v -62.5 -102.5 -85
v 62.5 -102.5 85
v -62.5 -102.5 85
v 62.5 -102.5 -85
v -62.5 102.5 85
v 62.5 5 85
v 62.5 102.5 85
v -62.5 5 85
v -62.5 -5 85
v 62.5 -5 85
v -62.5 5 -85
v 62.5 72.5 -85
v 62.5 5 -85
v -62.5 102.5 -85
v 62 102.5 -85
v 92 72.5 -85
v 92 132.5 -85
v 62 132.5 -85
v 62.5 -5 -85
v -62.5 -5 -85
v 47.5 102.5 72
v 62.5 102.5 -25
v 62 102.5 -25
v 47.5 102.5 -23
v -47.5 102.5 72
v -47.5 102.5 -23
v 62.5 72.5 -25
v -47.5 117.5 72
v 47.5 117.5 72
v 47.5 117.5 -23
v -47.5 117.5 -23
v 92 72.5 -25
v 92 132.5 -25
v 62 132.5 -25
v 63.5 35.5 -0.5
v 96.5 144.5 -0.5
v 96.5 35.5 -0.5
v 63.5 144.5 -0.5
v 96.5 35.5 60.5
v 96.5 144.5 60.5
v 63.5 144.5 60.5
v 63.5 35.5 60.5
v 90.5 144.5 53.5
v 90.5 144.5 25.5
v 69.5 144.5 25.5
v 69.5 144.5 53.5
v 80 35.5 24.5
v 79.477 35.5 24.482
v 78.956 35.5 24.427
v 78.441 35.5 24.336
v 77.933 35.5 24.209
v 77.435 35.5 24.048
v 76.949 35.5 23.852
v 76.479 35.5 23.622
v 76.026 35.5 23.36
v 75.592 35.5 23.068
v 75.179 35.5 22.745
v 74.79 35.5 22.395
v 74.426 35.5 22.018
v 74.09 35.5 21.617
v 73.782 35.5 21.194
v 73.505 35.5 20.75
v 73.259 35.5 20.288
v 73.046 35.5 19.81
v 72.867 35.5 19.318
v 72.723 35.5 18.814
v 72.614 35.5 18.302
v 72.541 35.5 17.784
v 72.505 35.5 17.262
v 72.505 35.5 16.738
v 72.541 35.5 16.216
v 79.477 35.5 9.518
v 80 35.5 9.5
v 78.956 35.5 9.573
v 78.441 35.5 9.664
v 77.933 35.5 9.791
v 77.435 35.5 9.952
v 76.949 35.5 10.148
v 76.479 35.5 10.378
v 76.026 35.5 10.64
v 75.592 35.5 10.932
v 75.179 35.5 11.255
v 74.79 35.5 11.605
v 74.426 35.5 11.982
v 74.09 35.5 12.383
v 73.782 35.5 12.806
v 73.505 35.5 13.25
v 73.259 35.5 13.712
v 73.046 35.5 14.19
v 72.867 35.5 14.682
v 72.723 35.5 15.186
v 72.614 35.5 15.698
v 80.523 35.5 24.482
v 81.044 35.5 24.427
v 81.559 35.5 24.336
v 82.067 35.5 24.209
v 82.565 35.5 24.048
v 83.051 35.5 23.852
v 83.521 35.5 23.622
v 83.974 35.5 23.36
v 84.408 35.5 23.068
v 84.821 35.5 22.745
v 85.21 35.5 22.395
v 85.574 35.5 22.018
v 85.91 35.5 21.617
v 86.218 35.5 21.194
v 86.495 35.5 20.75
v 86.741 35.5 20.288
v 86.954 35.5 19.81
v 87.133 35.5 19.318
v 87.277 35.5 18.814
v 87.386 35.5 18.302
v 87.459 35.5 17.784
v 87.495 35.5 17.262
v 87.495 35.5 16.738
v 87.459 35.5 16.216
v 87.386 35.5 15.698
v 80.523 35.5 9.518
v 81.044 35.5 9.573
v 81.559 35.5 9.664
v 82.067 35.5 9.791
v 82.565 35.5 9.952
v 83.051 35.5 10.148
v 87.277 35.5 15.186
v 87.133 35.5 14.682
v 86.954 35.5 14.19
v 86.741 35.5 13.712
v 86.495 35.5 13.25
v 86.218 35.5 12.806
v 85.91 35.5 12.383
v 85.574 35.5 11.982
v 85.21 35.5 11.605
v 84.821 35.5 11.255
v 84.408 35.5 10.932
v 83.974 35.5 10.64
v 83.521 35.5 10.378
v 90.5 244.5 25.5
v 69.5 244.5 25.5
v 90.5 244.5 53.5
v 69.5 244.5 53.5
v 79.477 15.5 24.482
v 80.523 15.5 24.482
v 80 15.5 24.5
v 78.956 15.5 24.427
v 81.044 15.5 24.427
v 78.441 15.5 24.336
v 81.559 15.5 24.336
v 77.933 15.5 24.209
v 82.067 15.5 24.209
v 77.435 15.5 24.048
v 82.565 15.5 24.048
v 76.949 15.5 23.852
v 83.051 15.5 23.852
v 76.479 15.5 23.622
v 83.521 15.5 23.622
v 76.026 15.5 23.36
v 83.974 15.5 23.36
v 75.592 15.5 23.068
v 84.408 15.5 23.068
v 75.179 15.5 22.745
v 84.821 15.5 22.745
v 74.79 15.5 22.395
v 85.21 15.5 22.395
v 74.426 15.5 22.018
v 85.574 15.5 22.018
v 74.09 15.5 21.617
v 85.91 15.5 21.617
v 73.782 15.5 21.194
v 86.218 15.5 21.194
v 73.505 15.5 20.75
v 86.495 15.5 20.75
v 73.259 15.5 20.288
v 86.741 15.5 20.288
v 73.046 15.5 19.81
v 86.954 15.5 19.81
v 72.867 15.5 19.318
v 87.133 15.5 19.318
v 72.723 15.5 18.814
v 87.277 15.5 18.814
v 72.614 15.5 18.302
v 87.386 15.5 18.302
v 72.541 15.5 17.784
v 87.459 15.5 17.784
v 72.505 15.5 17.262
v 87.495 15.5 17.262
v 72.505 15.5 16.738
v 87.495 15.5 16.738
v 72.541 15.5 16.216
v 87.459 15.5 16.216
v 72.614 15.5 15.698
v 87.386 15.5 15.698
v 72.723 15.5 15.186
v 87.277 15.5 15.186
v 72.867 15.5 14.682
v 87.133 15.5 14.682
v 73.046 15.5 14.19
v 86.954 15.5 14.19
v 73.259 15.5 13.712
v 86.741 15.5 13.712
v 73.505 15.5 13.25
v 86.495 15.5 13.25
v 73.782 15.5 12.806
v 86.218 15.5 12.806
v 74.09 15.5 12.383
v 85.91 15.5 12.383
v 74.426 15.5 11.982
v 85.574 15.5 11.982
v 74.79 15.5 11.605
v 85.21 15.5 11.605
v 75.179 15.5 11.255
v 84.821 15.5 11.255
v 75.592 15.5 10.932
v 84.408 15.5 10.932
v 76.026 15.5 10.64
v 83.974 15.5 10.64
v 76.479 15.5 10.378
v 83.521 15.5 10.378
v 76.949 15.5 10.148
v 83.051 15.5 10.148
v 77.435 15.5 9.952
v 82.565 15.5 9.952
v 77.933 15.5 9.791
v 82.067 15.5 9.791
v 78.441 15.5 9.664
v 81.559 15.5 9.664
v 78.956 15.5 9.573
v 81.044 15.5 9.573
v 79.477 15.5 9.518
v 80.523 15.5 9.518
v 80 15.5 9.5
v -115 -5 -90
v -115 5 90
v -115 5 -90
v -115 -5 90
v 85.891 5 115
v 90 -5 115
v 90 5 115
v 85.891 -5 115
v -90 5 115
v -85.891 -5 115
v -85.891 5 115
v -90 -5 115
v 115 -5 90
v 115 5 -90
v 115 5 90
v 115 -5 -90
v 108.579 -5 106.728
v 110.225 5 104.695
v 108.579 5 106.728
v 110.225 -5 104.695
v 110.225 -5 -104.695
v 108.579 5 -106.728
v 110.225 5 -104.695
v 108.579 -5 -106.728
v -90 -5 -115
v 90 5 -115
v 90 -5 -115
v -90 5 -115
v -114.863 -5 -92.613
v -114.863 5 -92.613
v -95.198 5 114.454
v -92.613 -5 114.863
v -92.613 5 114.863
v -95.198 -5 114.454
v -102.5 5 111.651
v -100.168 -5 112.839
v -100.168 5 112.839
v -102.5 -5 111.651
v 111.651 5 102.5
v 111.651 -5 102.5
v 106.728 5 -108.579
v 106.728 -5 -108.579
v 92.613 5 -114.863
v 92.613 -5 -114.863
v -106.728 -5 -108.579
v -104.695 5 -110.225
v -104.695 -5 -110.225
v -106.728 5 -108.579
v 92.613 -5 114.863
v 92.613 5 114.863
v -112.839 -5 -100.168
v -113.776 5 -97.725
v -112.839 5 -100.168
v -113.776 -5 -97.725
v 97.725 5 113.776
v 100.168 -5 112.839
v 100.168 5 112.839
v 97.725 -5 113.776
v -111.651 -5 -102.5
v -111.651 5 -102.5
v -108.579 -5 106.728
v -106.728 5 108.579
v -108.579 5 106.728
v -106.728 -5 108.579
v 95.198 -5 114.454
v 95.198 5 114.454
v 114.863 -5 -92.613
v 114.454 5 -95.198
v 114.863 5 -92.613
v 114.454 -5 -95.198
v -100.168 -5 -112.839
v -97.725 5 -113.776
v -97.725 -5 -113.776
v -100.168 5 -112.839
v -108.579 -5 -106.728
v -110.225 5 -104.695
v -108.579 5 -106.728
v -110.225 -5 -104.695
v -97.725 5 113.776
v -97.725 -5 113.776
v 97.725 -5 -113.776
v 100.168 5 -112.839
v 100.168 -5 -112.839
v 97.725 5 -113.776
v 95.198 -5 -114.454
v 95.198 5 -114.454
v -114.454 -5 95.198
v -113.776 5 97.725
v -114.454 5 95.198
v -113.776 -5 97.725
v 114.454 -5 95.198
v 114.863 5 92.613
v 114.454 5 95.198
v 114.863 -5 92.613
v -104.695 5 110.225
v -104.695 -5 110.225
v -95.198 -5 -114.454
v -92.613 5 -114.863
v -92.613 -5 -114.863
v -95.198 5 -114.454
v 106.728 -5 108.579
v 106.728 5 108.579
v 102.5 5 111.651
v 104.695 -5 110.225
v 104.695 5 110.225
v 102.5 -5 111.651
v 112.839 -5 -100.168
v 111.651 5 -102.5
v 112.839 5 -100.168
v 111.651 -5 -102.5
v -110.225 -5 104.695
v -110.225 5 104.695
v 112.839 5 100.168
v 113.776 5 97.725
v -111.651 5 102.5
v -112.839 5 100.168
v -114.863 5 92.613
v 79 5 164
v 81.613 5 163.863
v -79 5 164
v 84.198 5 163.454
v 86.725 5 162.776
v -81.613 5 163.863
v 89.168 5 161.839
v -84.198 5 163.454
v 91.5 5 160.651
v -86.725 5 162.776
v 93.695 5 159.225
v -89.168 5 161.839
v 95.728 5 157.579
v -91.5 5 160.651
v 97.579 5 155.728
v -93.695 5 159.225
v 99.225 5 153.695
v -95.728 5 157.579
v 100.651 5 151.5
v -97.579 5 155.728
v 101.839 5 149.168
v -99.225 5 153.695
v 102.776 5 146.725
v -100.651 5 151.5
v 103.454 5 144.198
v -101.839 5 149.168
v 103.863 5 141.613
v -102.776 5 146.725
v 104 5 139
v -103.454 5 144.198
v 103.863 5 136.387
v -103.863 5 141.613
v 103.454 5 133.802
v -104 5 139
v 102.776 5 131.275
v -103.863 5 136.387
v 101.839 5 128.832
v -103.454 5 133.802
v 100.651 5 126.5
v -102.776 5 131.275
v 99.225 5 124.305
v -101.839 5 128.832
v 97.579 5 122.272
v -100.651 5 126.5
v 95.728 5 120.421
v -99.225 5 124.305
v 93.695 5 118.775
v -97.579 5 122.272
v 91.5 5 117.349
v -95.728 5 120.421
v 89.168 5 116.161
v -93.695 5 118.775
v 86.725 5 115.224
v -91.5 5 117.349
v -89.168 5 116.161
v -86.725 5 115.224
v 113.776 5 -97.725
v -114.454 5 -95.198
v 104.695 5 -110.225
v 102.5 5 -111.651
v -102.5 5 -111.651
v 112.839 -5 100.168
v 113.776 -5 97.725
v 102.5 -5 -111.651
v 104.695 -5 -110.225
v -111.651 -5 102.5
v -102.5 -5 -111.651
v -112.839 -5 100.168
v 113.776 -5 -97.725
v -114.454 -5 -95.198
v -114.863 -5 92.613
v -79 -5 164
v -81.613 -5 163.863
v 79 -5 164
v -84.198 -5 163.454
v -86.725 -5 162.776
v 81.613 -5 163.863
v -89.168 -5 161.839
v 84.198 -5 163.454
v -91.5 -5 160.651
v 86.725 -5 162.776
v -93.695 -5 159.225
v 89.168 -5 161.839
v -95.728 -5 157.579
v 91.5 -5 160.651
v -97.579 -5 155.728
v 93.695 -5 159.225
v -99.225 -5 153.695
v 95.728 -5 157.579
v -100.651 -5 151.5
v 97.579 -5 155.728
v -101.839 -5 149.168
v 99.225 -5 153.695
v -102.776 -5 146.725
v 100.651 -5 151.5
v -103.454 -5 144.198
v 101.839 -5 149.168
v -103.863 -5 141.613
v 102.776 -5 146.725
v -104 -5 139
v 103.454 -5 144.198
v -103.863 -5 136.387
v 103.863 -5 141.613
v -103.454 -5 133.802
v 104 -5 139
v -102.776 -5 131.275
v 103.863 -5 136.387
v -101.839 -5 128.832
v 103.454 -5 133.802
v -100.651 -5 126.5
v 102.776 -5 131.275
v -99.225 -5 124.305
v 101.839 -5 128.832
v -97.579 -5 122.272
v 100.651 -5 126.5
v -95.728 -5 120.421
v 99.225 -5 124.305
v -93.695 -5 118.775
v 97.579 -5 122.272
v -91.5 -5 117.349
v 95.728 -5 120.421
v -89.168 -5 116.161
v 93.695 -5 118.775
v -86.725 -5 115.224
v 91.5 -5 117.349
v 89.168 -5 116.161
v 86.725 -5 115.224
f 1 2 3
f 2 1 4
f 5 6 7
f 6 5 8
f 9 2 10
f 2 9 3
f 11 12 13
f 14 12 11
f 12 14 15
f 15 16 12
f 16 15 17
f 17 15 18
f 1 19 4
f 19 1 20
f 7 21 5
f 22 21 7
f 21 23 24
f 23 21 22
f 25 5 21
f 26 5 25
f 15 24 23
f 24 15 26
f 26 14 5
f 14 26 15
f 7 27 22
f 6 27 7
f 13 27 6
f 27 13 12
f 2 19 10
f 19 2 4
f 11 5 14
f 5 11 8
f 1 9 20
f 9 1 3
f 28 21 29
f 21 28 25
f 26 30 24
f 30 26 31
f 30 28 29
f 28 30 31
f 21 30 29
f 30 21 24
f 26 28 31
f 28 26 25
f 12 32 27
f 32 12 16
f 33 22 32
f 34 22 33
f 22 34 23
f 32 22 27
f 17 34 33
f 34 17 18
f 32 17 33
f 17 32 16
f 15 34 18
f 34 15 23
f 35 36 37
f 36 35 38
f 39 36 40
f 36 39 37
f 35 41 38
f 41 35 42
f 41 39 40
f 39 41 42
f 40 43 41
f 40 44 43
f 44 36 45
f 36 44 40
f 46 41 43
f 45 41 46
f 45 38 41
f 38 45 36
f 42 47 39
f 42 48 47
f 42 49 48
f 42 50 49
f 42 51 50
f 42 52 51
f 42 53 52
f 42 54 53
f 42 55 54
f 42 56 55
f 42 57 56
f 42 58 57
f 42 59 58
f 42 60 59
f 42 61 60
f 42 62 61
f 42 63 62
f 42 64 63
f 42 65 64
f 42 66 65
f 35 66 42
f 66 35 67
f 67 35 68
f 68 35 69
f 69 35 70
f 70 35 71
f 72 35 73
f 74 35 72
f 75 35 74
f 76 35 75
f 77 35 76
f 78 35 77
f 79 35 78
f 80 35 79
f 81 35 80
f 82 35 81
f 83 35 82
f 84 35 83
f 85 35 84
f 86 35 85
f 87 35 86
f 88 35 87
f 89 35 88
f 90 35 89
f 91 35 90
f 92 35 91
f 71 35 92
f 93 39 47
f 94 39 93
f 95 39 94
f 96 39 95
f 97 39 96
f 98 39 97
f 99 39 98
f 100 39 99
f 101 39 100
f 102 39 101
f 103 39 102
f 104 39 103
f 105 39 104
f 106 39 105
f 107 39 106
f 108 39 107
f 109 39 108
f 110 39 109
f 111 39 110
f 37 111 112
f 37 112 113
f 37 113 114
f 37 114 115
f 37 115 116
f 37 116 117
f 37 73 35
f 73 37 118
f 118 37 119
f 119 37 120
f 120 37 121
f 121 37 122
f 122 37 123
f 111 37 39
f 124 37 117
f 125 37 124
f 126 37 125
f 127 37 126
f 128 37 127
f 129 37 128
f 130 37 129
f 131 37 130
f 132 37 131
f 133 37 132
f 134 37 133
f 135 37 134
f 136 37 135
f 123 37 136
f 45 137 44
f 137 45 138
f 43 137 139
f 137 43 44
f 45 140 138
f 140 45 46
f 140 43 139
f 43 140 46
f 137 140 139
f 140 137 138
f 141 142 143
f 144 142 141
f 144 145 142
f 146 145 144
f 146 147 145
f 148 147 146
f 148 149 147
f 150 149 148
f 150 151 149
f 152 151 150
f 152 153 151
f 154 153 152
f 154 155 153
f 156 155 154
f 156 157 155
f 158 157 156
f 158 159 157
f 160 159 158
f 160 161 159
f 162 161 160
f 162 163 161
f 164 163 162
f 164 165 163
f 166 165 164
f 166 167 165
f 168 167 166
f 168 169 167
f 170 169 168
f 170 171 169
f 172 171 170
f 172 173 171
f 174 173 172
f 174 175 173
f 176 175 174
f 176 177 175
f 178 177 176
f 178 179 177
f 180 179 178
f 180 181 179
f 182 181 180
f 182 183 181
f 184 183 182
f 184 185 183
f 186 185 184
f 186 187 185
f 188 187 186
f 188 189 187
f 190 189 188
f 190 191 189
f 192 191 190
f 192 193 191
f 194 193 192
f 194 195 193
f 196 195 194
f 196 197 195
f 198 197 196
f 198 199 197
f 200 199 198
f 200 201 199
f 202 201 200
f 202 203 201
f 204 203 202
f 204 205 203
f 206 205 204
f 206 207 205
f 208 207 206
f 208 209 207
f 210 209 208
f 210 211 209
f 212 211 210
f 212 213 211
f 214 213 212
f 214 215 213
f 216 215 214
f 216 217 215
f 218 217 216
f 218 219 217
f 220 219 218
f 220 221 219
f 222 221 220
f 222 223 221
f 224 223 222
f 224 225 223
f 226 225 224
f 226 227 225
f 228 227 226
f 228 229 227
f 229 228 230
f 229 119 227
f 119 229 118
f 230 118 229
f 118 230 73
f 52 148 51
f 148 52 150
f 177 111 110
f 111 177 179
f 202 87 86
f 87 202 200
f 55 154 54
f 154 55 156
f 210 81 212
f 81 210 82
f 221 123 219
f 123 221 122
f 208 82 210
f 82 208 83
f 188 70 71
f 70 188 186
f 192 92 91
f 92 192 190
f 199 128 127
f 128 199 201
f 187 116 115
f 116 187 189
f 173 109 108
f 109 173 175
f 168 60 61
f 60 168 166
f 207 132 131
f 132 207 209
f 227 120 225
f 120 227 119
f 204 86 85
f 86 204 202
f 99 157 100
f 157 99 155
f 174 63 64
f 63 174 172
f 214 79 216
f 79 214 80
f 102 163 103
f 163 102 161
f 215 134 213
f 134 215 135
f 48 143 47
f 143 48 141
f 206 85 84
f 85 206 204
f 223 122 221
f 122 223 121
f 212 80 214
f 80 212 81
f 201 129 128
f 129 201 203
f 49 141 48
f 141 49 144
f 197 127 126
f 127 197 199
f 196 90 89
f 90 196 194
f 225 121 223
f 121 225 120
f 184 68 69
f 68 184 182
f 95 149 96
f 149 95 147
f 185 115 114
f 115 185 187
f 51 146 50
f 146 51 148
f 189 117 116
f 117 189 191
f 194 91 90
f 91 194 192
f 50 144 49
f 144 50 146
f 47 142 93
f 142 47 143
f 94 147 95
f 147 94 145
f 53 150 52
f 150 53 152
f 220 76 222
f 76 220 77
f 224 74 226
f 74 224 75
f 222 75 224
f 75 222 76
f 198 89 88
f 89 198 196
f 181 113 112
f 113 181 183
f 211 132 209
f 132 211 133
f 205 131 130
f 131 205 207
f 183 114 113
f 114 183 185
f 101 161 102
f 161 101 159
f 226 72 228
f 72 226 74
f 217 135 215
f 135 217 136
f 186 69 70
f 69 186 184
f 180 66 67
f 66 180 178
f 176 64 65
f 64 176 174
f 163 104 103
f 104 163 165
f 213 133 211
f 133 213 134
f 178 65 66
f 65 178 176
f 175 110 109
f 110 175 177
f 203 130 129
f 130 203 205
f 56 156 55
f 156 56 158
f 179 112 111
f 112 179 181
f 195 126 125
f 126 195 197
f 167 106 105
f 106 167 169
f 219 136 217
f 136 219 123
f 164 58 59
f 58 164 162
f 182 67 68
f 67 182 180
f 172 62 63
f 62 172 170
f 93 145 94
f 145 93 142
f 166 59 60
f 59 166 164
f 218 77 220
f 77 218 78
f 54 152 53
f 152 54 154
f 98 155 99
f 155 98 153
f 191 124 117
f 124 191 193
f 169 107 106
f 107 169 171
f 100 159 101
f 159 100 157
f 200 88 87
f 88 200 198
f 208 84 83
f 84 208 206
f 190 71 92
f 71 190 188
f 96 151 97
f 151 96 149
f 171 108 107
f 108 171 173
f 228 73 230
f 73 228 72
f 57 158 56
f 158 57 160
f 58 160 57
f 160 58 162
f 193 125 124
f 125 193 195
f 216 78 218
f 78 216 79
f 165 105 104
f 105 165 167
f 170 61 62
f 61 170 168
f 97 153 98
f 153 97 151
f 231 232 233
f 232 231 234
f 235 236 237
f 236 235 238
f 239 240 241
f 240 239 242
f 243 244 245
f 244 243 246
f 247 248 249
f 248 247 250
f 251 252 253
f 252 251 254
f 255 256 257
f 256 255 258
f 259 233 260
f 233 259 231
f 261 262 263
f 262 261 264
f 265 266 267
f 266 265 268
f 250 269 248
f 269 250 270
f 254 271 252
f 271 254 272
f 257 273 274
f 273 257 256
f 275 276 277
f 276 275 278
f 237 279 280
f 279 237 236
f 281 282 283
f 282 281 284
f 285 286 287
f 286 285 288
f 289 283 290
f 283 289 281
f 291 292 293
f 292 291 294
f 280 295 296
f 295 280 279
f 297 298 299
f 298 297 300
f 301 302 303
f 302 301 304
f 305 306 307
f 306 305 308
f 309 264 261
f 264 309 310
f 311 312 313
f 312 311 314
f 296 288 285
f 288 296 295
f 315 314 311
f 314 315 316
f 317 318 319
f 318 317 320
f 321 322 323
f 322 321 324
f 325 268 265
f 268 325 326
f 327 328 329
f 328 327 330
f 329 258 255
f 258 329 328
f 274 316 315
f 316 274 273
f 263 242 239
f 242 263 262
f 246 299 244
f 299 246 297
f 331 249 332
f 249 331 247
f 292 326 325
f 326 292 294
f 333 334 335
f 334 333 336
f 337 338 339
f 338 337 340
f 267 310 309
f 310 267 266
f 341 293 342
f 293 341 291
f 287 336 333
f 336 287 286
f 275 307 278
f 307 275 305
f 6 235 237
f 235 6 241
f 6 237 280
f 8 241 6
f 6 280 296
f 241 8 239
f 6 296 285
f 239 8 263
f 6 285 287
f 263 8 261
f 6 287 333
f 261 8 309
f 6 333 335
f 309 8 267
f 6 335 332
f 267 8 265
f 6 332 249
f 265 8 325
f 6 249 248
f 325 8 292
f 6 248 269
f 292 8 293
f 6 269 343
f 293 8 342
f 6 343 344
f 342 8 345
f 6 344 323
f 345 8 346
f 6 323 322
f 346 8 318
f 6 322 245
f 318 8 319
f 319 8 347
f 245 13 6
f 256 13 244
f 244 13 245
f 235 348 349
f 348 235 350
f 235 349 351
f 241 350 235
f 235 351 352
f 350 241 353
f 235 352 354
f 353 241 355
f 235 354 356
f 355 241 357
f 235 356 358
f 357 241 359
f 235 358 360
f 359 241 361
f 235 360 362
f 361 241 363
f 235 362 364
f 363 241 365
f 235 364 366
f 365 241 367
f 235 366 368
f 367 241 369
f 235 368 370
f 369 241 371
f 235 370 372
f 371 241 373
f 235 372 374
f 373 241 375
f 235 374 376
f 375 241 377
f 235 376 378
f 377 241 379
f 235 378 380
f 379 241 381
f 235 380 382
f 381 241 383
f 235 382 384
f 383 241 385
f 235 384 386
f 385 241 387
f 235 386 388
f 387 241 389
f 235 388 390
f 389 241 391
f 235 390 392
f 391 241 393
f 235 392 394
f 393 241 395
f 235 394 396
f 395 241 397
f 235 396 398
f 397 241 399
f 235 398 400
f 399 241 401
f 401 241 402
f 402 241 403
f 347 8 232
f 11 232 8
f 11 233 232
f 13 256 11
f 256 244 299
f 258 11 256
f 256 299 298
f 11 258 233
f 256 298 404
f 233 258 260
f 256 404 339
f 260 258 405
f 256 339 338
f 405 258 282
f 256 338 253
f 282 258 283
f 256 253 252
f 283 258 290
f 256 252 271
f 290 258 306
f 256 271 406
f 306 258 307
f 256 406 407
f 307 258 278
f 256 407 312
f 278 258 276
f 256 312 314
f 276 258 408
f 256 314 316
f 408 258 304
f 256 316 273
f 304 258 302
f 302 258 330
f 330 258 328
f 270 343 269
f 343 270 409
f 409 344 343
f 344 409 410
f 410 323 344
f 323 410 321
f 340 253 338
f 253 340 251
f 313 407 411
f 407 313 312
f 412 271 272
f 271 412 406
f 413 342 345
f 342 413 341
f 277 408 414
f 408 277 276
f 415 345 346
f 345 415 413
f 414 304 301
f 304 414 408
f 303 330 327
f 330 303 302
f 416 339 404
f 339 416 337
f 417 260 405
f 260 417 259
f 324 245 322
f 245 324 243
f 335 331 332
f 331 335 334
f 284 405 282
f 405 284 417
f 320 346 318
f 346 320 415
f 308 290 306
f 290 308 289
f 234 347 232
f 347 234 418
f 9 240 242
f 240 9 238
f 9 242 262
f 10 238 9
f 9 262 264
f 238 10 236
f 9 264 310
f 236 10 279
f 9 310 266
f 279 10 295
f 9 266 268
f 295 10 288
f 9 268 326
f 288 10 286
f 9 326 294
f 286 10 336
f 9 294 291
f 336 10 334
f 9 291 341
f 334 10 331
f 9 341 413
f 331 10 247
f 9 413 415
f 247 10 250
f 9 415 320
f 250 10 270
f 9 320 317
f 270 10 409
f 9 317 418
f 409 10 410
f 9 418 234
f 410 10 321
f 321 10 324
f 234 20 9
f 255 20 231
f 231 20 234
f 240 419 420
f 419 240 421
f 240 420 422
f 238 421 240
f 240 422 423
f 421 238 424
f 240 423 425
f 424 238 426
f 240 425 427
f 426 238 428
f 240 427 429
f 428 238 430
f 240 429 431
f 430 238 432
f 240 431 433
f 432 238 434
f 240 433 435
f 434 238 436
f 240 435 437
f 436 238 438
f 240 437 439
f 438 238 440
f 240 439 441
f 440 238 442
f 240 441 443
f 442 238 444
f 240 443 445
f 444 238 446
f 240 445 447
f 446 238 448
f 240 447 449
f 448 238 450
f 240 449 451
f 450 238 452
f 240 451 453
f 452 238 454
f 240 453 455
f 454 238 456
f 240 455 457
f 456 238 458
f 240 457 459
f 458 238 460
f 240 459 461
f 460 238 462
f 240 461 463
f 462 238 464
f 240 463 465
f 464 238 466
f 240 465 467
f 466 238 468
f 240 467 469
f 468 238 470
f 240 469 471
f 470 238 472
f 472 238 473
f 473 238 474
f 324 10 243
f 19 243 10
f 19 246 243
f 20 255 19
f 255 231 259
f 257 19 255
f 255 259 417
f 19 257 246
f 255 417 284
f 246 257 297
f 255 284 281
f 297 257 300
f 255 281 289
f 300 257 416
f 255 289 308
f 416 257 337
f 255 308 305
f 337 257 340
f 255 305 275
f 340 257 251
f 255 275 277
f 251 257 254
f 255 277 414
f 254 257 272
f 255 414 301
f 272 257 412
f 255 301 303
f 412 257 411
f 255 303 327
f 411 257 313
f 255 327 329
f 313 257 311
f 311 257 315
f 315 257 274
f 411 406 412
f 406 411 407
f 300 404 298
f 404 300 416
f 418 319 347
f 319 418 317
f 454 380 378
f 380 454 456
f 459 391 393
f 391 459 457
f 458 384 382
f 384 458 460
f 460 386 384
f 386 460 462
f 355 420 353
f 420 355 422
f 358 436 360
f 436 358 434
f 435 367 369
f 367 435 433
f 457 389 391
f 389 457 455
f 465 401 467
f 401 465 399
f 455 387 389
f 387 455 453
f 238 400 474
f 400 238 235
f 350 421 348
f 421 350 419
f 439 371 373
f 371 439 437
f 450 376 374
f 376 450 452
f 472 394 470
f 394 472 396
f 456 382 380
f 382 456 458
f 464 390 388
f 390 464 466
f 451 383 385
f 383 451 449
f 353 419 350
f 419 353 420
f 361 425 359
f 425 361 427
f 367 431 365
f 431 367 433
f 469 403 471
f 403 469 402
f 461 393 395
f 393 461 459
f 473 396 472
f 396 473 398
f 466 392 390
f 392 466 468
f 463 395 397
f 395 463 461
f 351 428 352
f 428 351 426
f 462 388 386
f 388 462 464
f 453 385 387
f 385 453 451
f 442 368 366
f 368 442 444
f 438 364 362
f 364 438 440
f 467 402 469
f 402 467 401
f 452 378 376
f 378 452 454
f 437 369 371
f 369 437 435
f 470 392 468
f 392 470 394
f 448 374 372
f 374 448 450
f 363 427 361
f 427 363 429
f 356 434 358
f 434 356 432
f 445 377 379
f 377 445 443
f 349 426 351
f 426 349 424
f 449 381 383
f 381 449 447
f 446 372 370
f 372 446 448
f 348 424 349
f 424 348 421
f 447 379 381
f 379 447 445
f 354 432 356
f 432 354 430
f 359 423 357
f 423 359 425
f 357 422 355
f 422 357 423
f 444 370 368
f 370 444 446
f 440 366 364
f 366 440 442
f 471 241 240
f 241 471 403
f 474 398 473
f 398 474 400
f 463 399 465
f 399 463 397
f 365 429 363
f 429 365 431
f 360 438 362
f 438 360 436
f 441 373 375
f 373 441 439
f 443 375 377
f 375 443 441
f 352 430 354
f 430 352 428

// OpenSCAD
// file: Lib/o-ring.scad
module o_ring(id=20,girth=2.5,$fn=180){
    rotate_extrude(angle=360,$fn=$fn)translate([(id+girth)/2,0])circle(d=girth);
    //cylinder(d=id,h=0.1, center=true);    
}

//o_ring(id=40, girth=5);


module o_ring_groove(girth=3,length = 50, height = 100, radius = 15){
    translate([radius+(girth/2),radius+(girth/2),0]){
        difference(){
            o_ring(id=radius*2,girth=girth, $fn=$fn);
            translate([15,0,0])cube([30,40,6], center=true);
            translate([0,15,0])cube([40,30,6], center=true);
        }

        translate([-radius-(girth/2),length/2,0])
            rotate([90,0,0])
                cylinder(h=length+0.01,d=girth, center=true);

        translate([height/2,-radius-(girth/2),0])
            rotate([0,90,0])
                cylinder(h=height+0.01,d=girth, center=true);
    }
}

o_ring_groove();
// file: Lib/fillet_cylinder.scad
module filleted_cylinder(
    cylinder_height=2,
    cylinder_radius=1,
    fillet_radius_bottom=1,
    fillet_radius_top=0,
    nfaces=50
) {
    /* created by Kevin Lam on Dec 3, 2016 */
    union() {      
        cylinder(cylinder_height, r=cylinder_radius, $fn=nfaces, false);
        
        if (fillet_radius_bottom > 0) {
            difference() {
                cylinder(fillet_radius_bottom, r=cylinder_radius+fillet_radius_bottom, $fn=nfaces, false);
                translate([0, 0, fillet_radius_bottom])
                rotate_extrude($fn=nfaces)
                translate([cylinder_radius+fillet_radius_bottom, 0, 0])
                circle(fillet_radius_bottom, $fn=nfaces);
            }
        }
        
        if (fillet_radius_top>0) {
            difference() {
                translate([0,0,cylinder_height-fillet_radius_top])
                cylinder(fillet_radius_top, r=cylinder_radius+fillet_radius_top, $fn=nfaces, false);
                
                translate([0, 0, cylinder_height-fillet_radius_top])
                rotate_extrude($fn=nfaces)
                translate([cylinder_radius+fillet_radius_top, 0, 0])
                circle(fillet_radius_top, $fn=nfaces);
            }
        }
    }
}
// file: Lib/prism.scad
   module prism(l, w, h){
   polyhedron(
           points=[[0,0,0], [l,0,0], [l,w,0], [0,w,0], [0,w,h], [l,w,h]],
           faces=[[0,1,2,3],[5,4,3,2],[0,4,5,1],[0,3,4],[5,2,1]]
           );

   }
   
// file: Lib/corner_radiuser.scad
module cornerRadiuser(radius=6){
    difference(){
        translate([radius/2,radius/2,0])
        cube([radius,radius,radius*2], center=true);
        cylinder(h=(radius*2)+2,r=radius, center=true);
    }
}
// file: Lib/steppers.scad
/**
 * Implementation of a model of a 28BYJ-48 type cheapo stepper motor
 */
use <mirrorcopy.scad>;
module stepper28BYJ48(){
    color("lightgrey"){
        translate([0,-8,0]){
            // Motor body
            translate([0,0,(19/2)*-1]){
                cylinder(d=28,h=19, center=true);
            }

            // Motor snooter
            translate([0,8,0]){
                translate([0,0,(1.5/2)])cylinder(d=9,h=1.5, center=true);
                difference(){
                    translate([0,0,(5/2)+2])cylinder(d=5,h=6, center=true);
                    mirrorCopy([0,1,0]){
                        translate([0,4,(5/2)+2.1])cube([5,5,6.2], center=true);
                    }
                }
            }
            
            // cable gland
            translate([0,(17/2)*-1,(19/2)*-1]){
                cube([14.8,17,19], center=true);
            }
            
            // Attachment crossbar
            difference(){
                hull(){
                    mirrorCopy([1,-0,0]){
                        translate([(35/2),0,(1/2)*-1]){
                            cylinder(h=1,d=7, center=true);
                        }
                    }
                }
                mirrorCopy([1,-0,0]){
                    translate([(35/2),0,(1/2)*-1]){
                        cylinder(h=1+0.01,d=4.2, center=true);
                    }
                }
            }
        }
    }
}


module stepper28BYJ48_cutouts(){
    color("orange"){
        translate([0,-8,0]){
            mirrorCopy([1,-0,0]){
                translate([(35/2),0,(1/2)*-1]){
                    cylinder(h=1+0.01,d=4.2, center=true);
                }
            }
        }
    }
}

module nemaCutout(shaftClearance, shaftGirth, shaftLength, frameSize, holeSpacing,holeDiameter=3,       nemaSlotSlackMM=0, shaft=false){
    translate([0,0,frameSize/-2]){
        hull(){
            mirrorCopy([0,1,0]){
                translate([0,nemaSlotSlackMM/2]){
                    cube([frameSize*1.01,frameSize*1.01,frameSize], center=true);
                }
            }
        }
    }
    if(!shaft){
        translate([0,0,10/2]){
            mirrorCopy([1,0,0]){
                mirrorCopy([0,1,0]){
                    translate([holeSpacing/2,holeSpacing/2,0]){
                        hull(){
                            mirrorCopy([0,1,0]){
                                translate([0,nemaSlotSlackMM/2,0]){
                                    cylinder(d=holeDiameter*1.1,h=30,center=true);
                                }
                            }
                        }
                    }
                }
            }
        }
    }
    
    if(!shaft){
        translate([0,0,-0.5]){
            cylinder(d=shaftClearance*1.03,h=shaftLength+1);
        }
    }else{
        difference(){
            cylinder(d=shaftGirth*1.03,h=shaftLength*2, $fn=360);
            translate([frameSize/-2,(shaftGirth/2)-(shaftGirth)*0.15,shaftLength*0.3+0.01]){
                cube([frameSize,frameSize/2,shaftLength*0.70]);
                translate([0,0,shaftLength*0.70-1])cube([frameSize,frameSize/2,shaftLength+1]);
            }
        }
    }
}

module nema14_cutout(){
    nemaCutout(22,5,24,35,26,3,2, shaft);
}

module nema17_cutout(shaft=false){
    
    nemaCutout(22,5,24,42.3,31,3,2, shaft);
}

module nema23_cutout(shaft=false){
    //nemaCutout(, shaft);
}
nema17_cutout(true);
//nema23_cutout(true);
// file: Lib/metric_bolts.scad
use <mirrorcopy.scad>
capSizeMSizeMultiplier = 1.66*1.01;
printingKerfMM = 0.6;
circleFacets = 60;
boltColour = "LightSkyBlue";
boltClearanceColour = "LightSteelBlue";
boltClearanceTransparency = 0.3;

module metricBoltHex(mSize, structural=false, recessNut=0, recessNutIsCircleMM=false, chamfer=false){
    // Hex diameter = mSize * 1.8, (or 2.0 if structural
    // We add 1% to make the hex slip in better
    hexDiameter = (mSize * (structural?2.0:1.8) * 1.01) + printingKerfMM;

    color(boltColour)
    translate([0,0,(mSize*0.7)/2])
    cylinder(d=hexDiameter,h=mSize * 0.7, $fn=6, center=true);
    
    if(recessNut > 0){
        if(recessNutIsCircleMM==false){
            color(boltClearanceColour, boltClearanceTransparency)
                translate([0,0,(recessNut/2)*-1+0.1])
                    cylinder(d=hexDiameter,h=recessNut+0.1, $fn=6, center=true);
        }else{
            color(boltClearanceColour, boltClearanceTransparency)
                translate([0,0,(recessNut/2)*-1+0.1])
                    cylinder(d=recessNutIsCircleMM>hexDiameter?recessNutIsCircleMM:hexDiameter,h=recessNut+0.1, $fn=circleFacets, center=true);
        }
    }
    if(chamfer){
        chamferHeight = mSize*1.5*0.595;
        color(boltClearanceColour, boltClearanceTransparency)
            translate([0,0,(mSize * 0.7)+(chamferHeight/2)])
                cylinder(d1=hexDiameter,d2=0,h=chamferHeight, center=true, $fn=6);
    }
}

module metricSocketCap(mSize, length, structural=false,recessCap=0, chamfer=false, overrideCapSize=0){
    //cap size = M number * 1.5.
    // We add 1% to make the cap head spin nicely in the hole.
    capSize = overrideCapSize > 0 ? overrideCapSize : (mSize * capSizeMSizeMultiplier) + printingKerfMM;
    
    color(boltColour)
        translate([0,0,(length + ((mSize*1.25)/2))])
            cylinder(d=capSize,h=mSize*1.25, center=true, $fn=circleFacets);
    //echo (str("cap size is ", capSize));
    if(recessCap > 0){
        color(boltClearanceColour, boltClearanceTransparency)
        translate([0,0,(length + ((recessCap/2)+(mSize*1.25)))])
        cylinder(d=capSize,h=recessCap+0.01, center=true, $fn=circleFacets);
    }
    if(chamfer){
        color(boltClearanceColour, boltClearanceTransparency)
        translate([0,0,(length-((mSize*1.5*0.595)/2))])
        cylinder(d2=capSize,d1=0,h=mSize*1.5*0.595, center=true, $fn=circleFacets);
    }
}

module metricShaft(mSize, length, structural=false){
    color(boltColour)
        translate([0,0,(length/2)])
            cylinder(d=mSize+printingKerfMM, h=length+0.01, center=true, $fn=circleFacets);
}

module metricSocketScrew(mSize, length, structural=false, recessCap=0, chamfer=false, overrideCapSize=0){
    metricSocketCap(mSize, length, structural=structural, recessCap=recessCap, chamfer=chamfer, overrideCapSize=overrideCapSize);
    metricShaft(mSize, length, structural=structural);
}
module metricSocketScrewSlot(mSize, length, width, structural=false, recessCap=0, chamfer=false, overrideCapSize=0){
    
    hull()mirrorCopy()
        translate([width/2,0,0])
            metricSocketCap(mSize, length, structural=structural, recessCap=recessCap, chamfer=chamfer, overrideCapSize=overrideCapSize);
    hull()mirrorCopy()
        translate([width/2,0,0])
            metricShaft(mSize, length, structural=structural);
}

module metricCapheadAndBolt(mSize, length=40, structural=false, recessCap=0, recessNut=0, recessNutIsCircleMM=false, chamfer=false, overrideCapSize=0){
    capSize = overrideCapSize > 0 ? overrideCapSize : (mSize * capSizeMSizeMultiplier) + printingKerfMM;

    /*echo (str("Creating a M",mSize, " size, ", length, "mm long bolt with a ", capSize, "mm wide caphead and bolt ", chamfer?"with":"without", " chamfering."));
    if(recessCap){
        echo (str("It has a ", recessCap, "mm recessed cap"));
    }
    if(recessNut){
        echo (str("It has a ", recessCap, "mm recessed nut"));
    }/**/
    translate([0,0,((length/2)+((mSize*1.25)/2))*-1])
    union(){
        translate([0, 0, 0])
        metricSocketScrew(mSize, length, structural=structural, recessCap=recessCap, chamfer=chamfer, overrideCapSize=overrideCapSize);
        metricBoltHex(mSize,structural, recessNut=recessNut, recessNutIsCircleMM=recessNutIsCircleMM, chamfer=chamfer);
    }
}
module metricCapheadAndNutsert(mSize, length=40, nutsertLength=13, mSizeRatio=1.35 ,structural=false, recessCap=0, chamfer=false,overrideCapSize=0){
        capSize = overrideCapSize > 0 ? overrideCapSize : (mSize * capSizeMSizeMultiplier) + printingKerfMM;
    
    translate([0,0,((length/2)+((mSize*1.25)/2))*-1])
    union(){
        translate([0, 0, 0])
        metricSocketScrew(mSize, length, structural=structural, recessCap=recessCap, chamfer=chamfer, overrideCapSize=overrideCapSize);
        metricThreadedNutsert(mSize, length=nutsertLength,mSizeRatio=mSizeRatio);
    }
}

module metricThreadedNutsert(mSize, length=13, mSizeRatio=1.35){
    width = mSize * mSizeRatio;
    translate([0,0,-1]){
        translate([0,0,length/2])
            cylinder(h=length, d=width, center=true);
        translate([0,0,length/8/2])
            cylinder(h=length/8, d2=width, d1=width*1.1, center=true);
    }
}
/**/
translate([0,10,0])
metricCapheadAndBolt(6, 40);

translate([0,10,0])
metricCapheadAndBolt(6, 40, recessNut=20, recessNutIsCircleMM=20);

translate([20,10,0])
metricCapheadAndBolt(6, 40, recessNut=1, recessCap=1, chamfer=true);

translate([40,10,0]){
    metricCapheadAndNutsert(6, 40, 13, recessCap=1, chamfer=true);
}
translate([60,10,0]){
    metricSocketScrewSlot(6,40,10);
}
/**/
/*
translate([0,10,0])
metricCapheadAndBolt(6, 20, recessNut=10, recessCap=10);
/*
translate([0,20,0])
metricCapheadAndBolt(6, 20, chamfer=true);

translate([20,0,0])
metricCapheadAndBolt(10, 40);

translate([20,20,0])
metricCapheadAndBolt(10, 40, recessNut=10, recessCap=10);

translate([20,40,0])
metricCapheadAndBolt(10, 40, chamfer=true);
*/
// file: Lib/pcd.scad
module pcd(degrees, totalDegrees=360){
    count=totalDegrees/degrees;
    for(i=[1 : count]){
        rotate(degrees*i)
        children();
    }
}

module pcdAtFixedDegrees(degrees){
    for(degree=degrees){
        rotate(degree)
        children();
    }
}

pcd(30)
    translate([30,0,0])
        cylinder(h=10,d=5, center=true, $fn=30);
// file: Lib/hollower.scad
module hollower(wallThickness=1, box=300, bottomLift=0){
    difference() {
        children();
        translate([0,0,-box/2]) cube(box,center=true);
        difference() {
            translate([0,0,(box/2)-0.001+bottomLift]) cube(box,center=true);
            minkowski() {
                translate([0,0,0])cube(2*wallThickness,center=true);  
                difference() {
                    translate([0,0,(box/2)+bottomLift]) cube(box,center=true);
                    children();
                }
            }
        }
    }
}
// file: Lib/extrusion.scad
use <mirrorcopy.scad>
module doubleExtrusion(width,length, center=false){
    extraWallWidth = width*0.09;
    mirrorCopy([0,1,0]){
        color("orange")
        translate([0,(width - extraWallWidth)/2,length/2])
        cube([center?0:width/2,extraWallWidth,length], center=true);
    }
    
    translate([(width/2),0,0])
    children();
    translate([(width/2)*-1,0,0])
    children();
    color("grey",0.1)hull(){
        translate([(width/2),0,0])
        children();
        translate([(width/2)*-1,0,0])
        children();
    }
}

module extrusion_sub(length=10, outer=40, tSlot=8, gusset=4.5, bore=7, center=false){
    translate([0,0,center?0:length/2]){
        difference(){
            color("orange")
            union(){
                // Corners
                mirrorCopy([1,0,0]){
                    mirrorCopy([0,1,0]){
                        difference(){
                            union(){
                                translate([((outer-(outer-tSlot)/2)/2),(outer-(gusset))/2,0])
                                cube([(outer-tSlot)/2, (gusset),length], center=true);
                                mirror([-1,1,0])
                                translate([((outer-(outer-tSlot)/2)/2),(outer-(gusset))/2,0])
                                cube([(outer-tSlot)/2, (gusset),length], center=true);
                            }
                            difference(){
                                translate([((outer-(gusset))/2)+1,((outer-(gusset))/2)+1,0])
                                    cube([gusset*2,gusset*2,length+2], center=true);
                                translate([(outer-(gusset*2))/2,(outer-(gusset*2))/2,0])
                                    cylinder(d=gusset*2,h=length+4, center=true);
                            }
                        }
                    }
                }
                
                // Crossbar
                mirrorCopy(){
                    rotate(45)
                    cube([outer*1.3, gusset, length], center=true);
                }
                
                // Core
                cube([bore*2,bore*2,length], center=true);
            };
            
            union(){
                // Tappable Bore
                cylinder(d=bore, h=length+2, center=true);
            }
        }
    }
}
module extrusion(length=10, outer=40, tSlot=8, gusset=4.5, bore=7, center=false){
    color("grey",0.1)hull()extrusion_sub(length=length, outer=outer, tSlot=tSlot, gusset=gusset, bore=bore, center=center);
    extrusion_sub(length=length, outer=outer, tSlot=tSlot, gusset=gusset, bore=bore, center=center);
    echo(str("BOM: Extrusion(",outer,"mm) length=",length,"mm"));
}

module extrusion80x40(length, center=false){
    doubleExtrusion(40,length, center=center)
    extrusion40x40(length, center=center);
}
module extrusion60x30(length, center=false){
    doubleExtrusion(30,length, center=center)
    extrusion30x30(length, center=center);
}
module extrusion40x20(length, center=false){
    doubleExtrusion(20,length, center=center)
    extrusion20x20(length, center=center);
}

module extrusion20x20(length, center=false)
{
    extrusion(length=length, outer=20,tSlot=5, gusset=1.8, bore=4, center=center);
}

module extrusion30x30(length, center=false)
{
    extrusion(length=length, outer=30,tSlot=8, gusset=2.5, bore=7, center=center);
}

module extrusion40x40(length, center=false)
{
    extrusion(length=length, outer=40,tSlot=8, gusset=4.5, bore=7, center=center);
}
/**/
translate([-40,0,0])extrusion20x20(10, center=true);
translate([-60,30,0])extrusion30x30(10, center=true);
translate([-80,30+40,0])extrusion40x40(10, center=true);

translate([0,0,0])extrusion20x20(10);
translate([0,30,0])extrusion30x30(10);
translate([0,30+40,0])extrusion40x40(10);

translate([40,0,0])extrusion40x20(10);
translate([60,30,0])extrusion60x30(10);
translate([80,30+40,0])extrusion80x40(10);
/**/
// file: Lib/part_splitter.scad
module partSplitter(height=0,maxSize=200, spread=10, top=true, bottom=true){
    if($preview){
        children();
        translate([0,0,height])
            #cube([maxSize,maxSize,0.01], center=true);
    }else{
        if(top){
            color("red")
                translate([0,0,(spread/2)])
                    difference(){
                        children();
                        translate([0,0,((maxSize/2)*-1)+height])
                            cube([maxSize,maxSize,maxSize], center=true);
                    }
        }
        if(bottom){
            color("green")
                translate([0,0,(spread/2)*-1])
                    difference(){
                        children();
                        translate([0,0,(maxSize/2)+height])
                            cube([maxSize,maxSize,maxSize], center=true);
                    }
        }
    }
} 
// file: Lib/mirrorcopy.scad
module mirrorCopy(vec=[1,0,0], vec2=[0,0,0], vec3=[0,0,0]){
    
    //echo(str("Vec1=",vec," Vec2=", vec2, " Vec3=", vec3));
    children();
    mirror(vec) children();

    if(vec2){    
        mirror(vec2){
            children();
            mirror(vec) children();
        }
    }

    if(vec3){
        mirror(vec3){
            children();
            mirror(vec) children();
            mirror(vec2){
                children();
                mirror(vec) children();
            }
        }
    }
    
} 

mirrorCopy([1,0,0])color("green")translate([5,10,0])cylinder(h=1,d=5,center=true);
mirrorCopy([1,0,0],[0,1,0])color("blue")translate([10,5,0])cylinder(h=1,d=5,center=true);
mirrorCopy([1,0,0],[0,1,0],[0,0,1])color("red")translate([15,10,5])cylinder(h=1,d=5,center=true);
// file: Lib/bearings.scad
$useMcMaster = true;
module bearing(id, od, wd, mcmaster, series, labels=false){
    //echo(str("Creating a ", series, " bearing with id=", id, "mm od=", od, "mm width=", wd, "mm ..."));
    difference(){
        color("grey")cylinder(d=od,h=wd, center=true);
        color("white")cylinder(d=id,h=wd+1, center=true);  
        if($preview && labels){
            bearing_lettering(id, od, wd, mcmaster, series);    
        }
    }
}

module bearing_lettering(id, od, wd, mcmaster, series)
{
    degreesSeries = 25*len(series);
    degreesMcMaster = 25*len(mcmaster);
    color("black")
    rotate(180+45){
        rotate(degreesSeries)
        bearing_text(id,od, wd, series,degreesSeries);
        if($useMcMaster){
            rotate(degreesMcMaster+degreesSeries+10)
            bearing_text(id,od, wd, mcmaster, degreesMcMaster);   
        }
    }
}

module bearing_text(id, od, wd, st, radiusConsumed=180){
    bearingGirth = (od-id)/2;
    letterHeight = bearingGirth * 0.6;
    letterOffsetFromCenter = (od/2) - (bearingGirth*0.9);
    
    width=bearingGirth ;
    thickness=wd/20 ;
    chars=len(st)+1 ;
    //echo(str("Writing ", st, " at " , letterOffsetFromCenter, "mm from center"));
    for (i = [1:chars]) {
            rotate([0,0,90-(i*(radiusConsumed/chars))])
            translate([0,letterOffsetFromCenter,(bearingGirth/2)-((thickness+1)/2)])
            linear_extrude(thickness+1)
            text(st[i-1],size=letterHeight, halign="center");
    }
}


module bearing_608(labels=true){ bearing(8,22,7,"5972K91","608", labels=labels); }
module bearing_626(labels=true){ bearing(6,19,6,"6661K11","626", labels=labels); }
module bearing_629(labels=true){ bearing(9,26,8,"5972K93","629", labels=labels); }
module bearing_635(labels=true){ bearing(5,19,6,"5972K197","635", labels=labels); }
module bearing_6000(labels=true){ bearing(10,26,8,"5972K94","6000", labels=labels); }
module bearing_6001(labels=true){ bearing(12,28,8,"5972K95","6001", labels=labels); }
module bearing_6002(labels=true){ bearing(15,32,9,"5972K358","6002", labels=labels); }
module bearing_6003(labels=true){ bearing(17,35,10,"5972K311","6003", labels=labels); }
module bearing_6007(labels=true){ bearing(35,62,14,"5972K312","6007", labels=labels); }
module bearing_6200(labels=true){ bearing(10,30,9,"5972K101","6200", labels=labels); }
module bearing_6201(labels=true){ bearing(12,32,10,"5972K313","6201", labels=labels); }
module bearing_6202(labels=true){ bearing(15,35,11,"5972K314","6202", labels=labels); }
module bearing_6203(labels=true){ bearing(17,40,12,"5972K104","6203", labels=labels); }
module bearing_6204(labels=true){ bearing(20,47,14,"5972K105","6204", labels=labels); }
module bearing_6205(labels=true){ bearing(25,52,15,"5972K315","6205", labels=labels); }
module bearing_6206(labels=true){ bearing(30,62,16,"5972K316","6206", labels=labels); }
module bearing_6207(labels=true){ bearing(35,72,17,"5972K317","6207", labels=labels); }
module bearing_6208(labels=true){ bearing(40,80,18,"5972K114","6208", labels=labels); }
module bearing_6209(labels=true){ bearing(45,85,19,"5972K115","6209", labels=labels); }
module bearing_6210(labels=true){ bearing(50,90,20,"5972K129","6210", labels=labels); }
module bearing_6211(labels=true){ bearing(55,100,21,"5972K113","6211", labels=labels); }
module bearing_6212(labels=true){ bearing(60,110,22,"5972K3","6212", labels=labels); }
module bearing_6301(labels=true){ bearing(12,37,12,"5972K318","6301", labels=labels); }
module bearing_6302(labels=true){ bearing(15,42,13,"5972K117","6302", labels=labels); }
module bearing_6303(labels=true){ bearing(17,47,14,"5972K118","6303", labels=labels); }
module bearing_6304(labels=true){ bearing(20,52,15,"5972K119","6304", labels=labels); }
module bearing_6305(labels=true){ bearing(25,62,17,"5972K121","6305", labels=labels); }
module bearing_6306(labels=true){ bearing(30,72,19,"5972K319","6306", labels=labels); }
module bearing_6307(labels=true){ bearing(35,80,21,"5972K503","6307", labels=labels); }
module bearing_6308(labels=true){ bearing(40,90,23,"5972K124","6308", labels=labels); }
module bearing_6309(labels=true){ bearing(45,100,25,"5972K125","6309", labels=labels); }
module bearing_6310(labels=true){ bearing(50,110,27,"5972K126","6310", labels=labels); }
module bearing_6311(labels=true){ bearing(55,120,29,"5972K127","6311", labels=labels); }
module bearing_6312(labels=true){ bearing(60,130,31,"5972K128","6312", labels=labels); }
module bearing_6403(labels=true){ bearing(17,62,17,"5972K198","6403", labels=labels); }
module bearing_6800(labels=true){ bearing(10,19,5,"5972K211","6800", labels=labels); }
module bearing_6801(labels=true){ bearing(12,21,5,"5972K212","6801", labels=labels); }
module bearing_6802(labels=true){ bearing(15,24,5,"5972K213","6802", labels=labels); }
module bearing_6803(labels=true){ bearing(17,26,5,"5972K214","6803", labels=labels); }
module bearing_6804(labels=true){ bearing(20,32,7,"5972K215","6804", labels=labels); }
module bearing_6805(labels=true){ bearing(25,37,7,"5972K216","6805", labels=labels); }
module bearing_6806(labels=true){ bearing(30,42,7,"5972K217","6806", labels=labels); }
module bearing_6900(labels=true){ bearing(10,22,6,"5972K241","6900", labels=labels); }
module bearing_6901(labels=true){ bearing(12,24,6,"5972K242","6901", labels=labels); }
module bearing_6902(labels=true){ bearing(15,28,7,"5972K243","6902", labels=labels); }
module bearing_6903(labels=true){ bearing(17,30,7,"5972K244","6903", labels=labels); }
module bearing_6904(labels=true){ bearing(20,37,9,"5972K245","6904", labels=labels); }
module bearing_6905(labels=true){ bearing(25,42,9,"5972K246","6905", labels=labels); }
module bearing_6906(labels=true){ bearing(30,47,9,"5972K247","6906", labels=labels); }
module bearing_6907(labels=true){ bearing(35,55,10,"5972K248","6907", labels=labels); }
module bearing_6908(labels=true){ bearing(40,62,12,"5972K249","6908", labels=labels); }
module bearing_16002(labels=true){ bearing(15,32,8,"5972K199","16002", labels=labels); }
module bearing_16004(labels=true){ bearing(20,42,8,"5972K218","16004", labels=labels); }
module bearing_16005(labels=true){ bearing(25,47,8,"5972K219","16005", labels=labels); }
module bearing_16100(labels=true){ bearing(10,28,8,"5972K223","16100", labels=labels); }
module bearing_16101(labels=true){ bearing(12,30,8,"5972K224","16101", labels=labels); }

translate([0,0,0])
{   
    bearing_6800();
    bearing_6804();
    bearing_6907();
    translate([50,0,0])
    bearing_16101();
}


translate([0,60,0])
{   
    bearing_6800(labels=false);
    bearing_6804(labels=false);
    bearing_6907(labels=false);
    translate([50,0,0])
    bearing_16101(labels=false);
}
// file: Lib/mattlib.scad
include <../Lib/bearings.scad>;
include <../Lib/mirrorcopy.scad>;
include <../Lib/part_splitter.scad>;
include <../Lib/extrusion.scad>;
include <../Lib/hollower.scad>;
include <../Lib/pcd.scad>;
include <../Lib/metric_bolts.scad>;
include <../Lib/steppers.scad>;
include <../Lib/corner_radiuser.scad>;
include <../Lib/gears.scad>;
include <../Lib/prism.scad>;
include <../Lib/fillet_cylinder.scad>;
include <../Lib/o-ring.scad>;
// main file
use <Lib/mattlib.scad>;
$fn=90;
module fantec_4_drive_caddy(){
    color("orange"){
        cube([205,125,170], center=true);
        translate([-110,0,37.5-13])cube([15,95,95], center=true);
        translate([-100+12.5-15,77,-55])cube([60,30,60], center=true);
    }
}

module power_supply(){
    color("green"){
        cube([61,109,33], center=true);
        translate([-16.5+7,100/2+109/2,0])cube([28,100,21], center=true);
        translate([(61/2)-(15/2)-10,(20/2+109/2)*-1,0])rotate([90,0,0])cylinder(d=15,h=20, center=true);
    }
}
rotate([0,0,-90])fantec_4_drive_caddy();
translate([80,90,30])rotate([0,90,0])power_supply();

hull(){
mirrorCopy([1,0,0],[0,0,1])
    translate([90,0,90])
        rotate([0,90,90])
            #cylinder(d=50,h=10, center=true);
}
#hull(){
    translate([0,0,90+25])
        rotate([0,90,90])
            scale([.3,.8,1])
                cylinder(d=100, h=10, center=true);
    mirrorCopy([1,0,0])
        translate([90-11,0,90+50-1])
            rotate([0,90,90])
                cylinder(d=50,h=10, center=true);
}
